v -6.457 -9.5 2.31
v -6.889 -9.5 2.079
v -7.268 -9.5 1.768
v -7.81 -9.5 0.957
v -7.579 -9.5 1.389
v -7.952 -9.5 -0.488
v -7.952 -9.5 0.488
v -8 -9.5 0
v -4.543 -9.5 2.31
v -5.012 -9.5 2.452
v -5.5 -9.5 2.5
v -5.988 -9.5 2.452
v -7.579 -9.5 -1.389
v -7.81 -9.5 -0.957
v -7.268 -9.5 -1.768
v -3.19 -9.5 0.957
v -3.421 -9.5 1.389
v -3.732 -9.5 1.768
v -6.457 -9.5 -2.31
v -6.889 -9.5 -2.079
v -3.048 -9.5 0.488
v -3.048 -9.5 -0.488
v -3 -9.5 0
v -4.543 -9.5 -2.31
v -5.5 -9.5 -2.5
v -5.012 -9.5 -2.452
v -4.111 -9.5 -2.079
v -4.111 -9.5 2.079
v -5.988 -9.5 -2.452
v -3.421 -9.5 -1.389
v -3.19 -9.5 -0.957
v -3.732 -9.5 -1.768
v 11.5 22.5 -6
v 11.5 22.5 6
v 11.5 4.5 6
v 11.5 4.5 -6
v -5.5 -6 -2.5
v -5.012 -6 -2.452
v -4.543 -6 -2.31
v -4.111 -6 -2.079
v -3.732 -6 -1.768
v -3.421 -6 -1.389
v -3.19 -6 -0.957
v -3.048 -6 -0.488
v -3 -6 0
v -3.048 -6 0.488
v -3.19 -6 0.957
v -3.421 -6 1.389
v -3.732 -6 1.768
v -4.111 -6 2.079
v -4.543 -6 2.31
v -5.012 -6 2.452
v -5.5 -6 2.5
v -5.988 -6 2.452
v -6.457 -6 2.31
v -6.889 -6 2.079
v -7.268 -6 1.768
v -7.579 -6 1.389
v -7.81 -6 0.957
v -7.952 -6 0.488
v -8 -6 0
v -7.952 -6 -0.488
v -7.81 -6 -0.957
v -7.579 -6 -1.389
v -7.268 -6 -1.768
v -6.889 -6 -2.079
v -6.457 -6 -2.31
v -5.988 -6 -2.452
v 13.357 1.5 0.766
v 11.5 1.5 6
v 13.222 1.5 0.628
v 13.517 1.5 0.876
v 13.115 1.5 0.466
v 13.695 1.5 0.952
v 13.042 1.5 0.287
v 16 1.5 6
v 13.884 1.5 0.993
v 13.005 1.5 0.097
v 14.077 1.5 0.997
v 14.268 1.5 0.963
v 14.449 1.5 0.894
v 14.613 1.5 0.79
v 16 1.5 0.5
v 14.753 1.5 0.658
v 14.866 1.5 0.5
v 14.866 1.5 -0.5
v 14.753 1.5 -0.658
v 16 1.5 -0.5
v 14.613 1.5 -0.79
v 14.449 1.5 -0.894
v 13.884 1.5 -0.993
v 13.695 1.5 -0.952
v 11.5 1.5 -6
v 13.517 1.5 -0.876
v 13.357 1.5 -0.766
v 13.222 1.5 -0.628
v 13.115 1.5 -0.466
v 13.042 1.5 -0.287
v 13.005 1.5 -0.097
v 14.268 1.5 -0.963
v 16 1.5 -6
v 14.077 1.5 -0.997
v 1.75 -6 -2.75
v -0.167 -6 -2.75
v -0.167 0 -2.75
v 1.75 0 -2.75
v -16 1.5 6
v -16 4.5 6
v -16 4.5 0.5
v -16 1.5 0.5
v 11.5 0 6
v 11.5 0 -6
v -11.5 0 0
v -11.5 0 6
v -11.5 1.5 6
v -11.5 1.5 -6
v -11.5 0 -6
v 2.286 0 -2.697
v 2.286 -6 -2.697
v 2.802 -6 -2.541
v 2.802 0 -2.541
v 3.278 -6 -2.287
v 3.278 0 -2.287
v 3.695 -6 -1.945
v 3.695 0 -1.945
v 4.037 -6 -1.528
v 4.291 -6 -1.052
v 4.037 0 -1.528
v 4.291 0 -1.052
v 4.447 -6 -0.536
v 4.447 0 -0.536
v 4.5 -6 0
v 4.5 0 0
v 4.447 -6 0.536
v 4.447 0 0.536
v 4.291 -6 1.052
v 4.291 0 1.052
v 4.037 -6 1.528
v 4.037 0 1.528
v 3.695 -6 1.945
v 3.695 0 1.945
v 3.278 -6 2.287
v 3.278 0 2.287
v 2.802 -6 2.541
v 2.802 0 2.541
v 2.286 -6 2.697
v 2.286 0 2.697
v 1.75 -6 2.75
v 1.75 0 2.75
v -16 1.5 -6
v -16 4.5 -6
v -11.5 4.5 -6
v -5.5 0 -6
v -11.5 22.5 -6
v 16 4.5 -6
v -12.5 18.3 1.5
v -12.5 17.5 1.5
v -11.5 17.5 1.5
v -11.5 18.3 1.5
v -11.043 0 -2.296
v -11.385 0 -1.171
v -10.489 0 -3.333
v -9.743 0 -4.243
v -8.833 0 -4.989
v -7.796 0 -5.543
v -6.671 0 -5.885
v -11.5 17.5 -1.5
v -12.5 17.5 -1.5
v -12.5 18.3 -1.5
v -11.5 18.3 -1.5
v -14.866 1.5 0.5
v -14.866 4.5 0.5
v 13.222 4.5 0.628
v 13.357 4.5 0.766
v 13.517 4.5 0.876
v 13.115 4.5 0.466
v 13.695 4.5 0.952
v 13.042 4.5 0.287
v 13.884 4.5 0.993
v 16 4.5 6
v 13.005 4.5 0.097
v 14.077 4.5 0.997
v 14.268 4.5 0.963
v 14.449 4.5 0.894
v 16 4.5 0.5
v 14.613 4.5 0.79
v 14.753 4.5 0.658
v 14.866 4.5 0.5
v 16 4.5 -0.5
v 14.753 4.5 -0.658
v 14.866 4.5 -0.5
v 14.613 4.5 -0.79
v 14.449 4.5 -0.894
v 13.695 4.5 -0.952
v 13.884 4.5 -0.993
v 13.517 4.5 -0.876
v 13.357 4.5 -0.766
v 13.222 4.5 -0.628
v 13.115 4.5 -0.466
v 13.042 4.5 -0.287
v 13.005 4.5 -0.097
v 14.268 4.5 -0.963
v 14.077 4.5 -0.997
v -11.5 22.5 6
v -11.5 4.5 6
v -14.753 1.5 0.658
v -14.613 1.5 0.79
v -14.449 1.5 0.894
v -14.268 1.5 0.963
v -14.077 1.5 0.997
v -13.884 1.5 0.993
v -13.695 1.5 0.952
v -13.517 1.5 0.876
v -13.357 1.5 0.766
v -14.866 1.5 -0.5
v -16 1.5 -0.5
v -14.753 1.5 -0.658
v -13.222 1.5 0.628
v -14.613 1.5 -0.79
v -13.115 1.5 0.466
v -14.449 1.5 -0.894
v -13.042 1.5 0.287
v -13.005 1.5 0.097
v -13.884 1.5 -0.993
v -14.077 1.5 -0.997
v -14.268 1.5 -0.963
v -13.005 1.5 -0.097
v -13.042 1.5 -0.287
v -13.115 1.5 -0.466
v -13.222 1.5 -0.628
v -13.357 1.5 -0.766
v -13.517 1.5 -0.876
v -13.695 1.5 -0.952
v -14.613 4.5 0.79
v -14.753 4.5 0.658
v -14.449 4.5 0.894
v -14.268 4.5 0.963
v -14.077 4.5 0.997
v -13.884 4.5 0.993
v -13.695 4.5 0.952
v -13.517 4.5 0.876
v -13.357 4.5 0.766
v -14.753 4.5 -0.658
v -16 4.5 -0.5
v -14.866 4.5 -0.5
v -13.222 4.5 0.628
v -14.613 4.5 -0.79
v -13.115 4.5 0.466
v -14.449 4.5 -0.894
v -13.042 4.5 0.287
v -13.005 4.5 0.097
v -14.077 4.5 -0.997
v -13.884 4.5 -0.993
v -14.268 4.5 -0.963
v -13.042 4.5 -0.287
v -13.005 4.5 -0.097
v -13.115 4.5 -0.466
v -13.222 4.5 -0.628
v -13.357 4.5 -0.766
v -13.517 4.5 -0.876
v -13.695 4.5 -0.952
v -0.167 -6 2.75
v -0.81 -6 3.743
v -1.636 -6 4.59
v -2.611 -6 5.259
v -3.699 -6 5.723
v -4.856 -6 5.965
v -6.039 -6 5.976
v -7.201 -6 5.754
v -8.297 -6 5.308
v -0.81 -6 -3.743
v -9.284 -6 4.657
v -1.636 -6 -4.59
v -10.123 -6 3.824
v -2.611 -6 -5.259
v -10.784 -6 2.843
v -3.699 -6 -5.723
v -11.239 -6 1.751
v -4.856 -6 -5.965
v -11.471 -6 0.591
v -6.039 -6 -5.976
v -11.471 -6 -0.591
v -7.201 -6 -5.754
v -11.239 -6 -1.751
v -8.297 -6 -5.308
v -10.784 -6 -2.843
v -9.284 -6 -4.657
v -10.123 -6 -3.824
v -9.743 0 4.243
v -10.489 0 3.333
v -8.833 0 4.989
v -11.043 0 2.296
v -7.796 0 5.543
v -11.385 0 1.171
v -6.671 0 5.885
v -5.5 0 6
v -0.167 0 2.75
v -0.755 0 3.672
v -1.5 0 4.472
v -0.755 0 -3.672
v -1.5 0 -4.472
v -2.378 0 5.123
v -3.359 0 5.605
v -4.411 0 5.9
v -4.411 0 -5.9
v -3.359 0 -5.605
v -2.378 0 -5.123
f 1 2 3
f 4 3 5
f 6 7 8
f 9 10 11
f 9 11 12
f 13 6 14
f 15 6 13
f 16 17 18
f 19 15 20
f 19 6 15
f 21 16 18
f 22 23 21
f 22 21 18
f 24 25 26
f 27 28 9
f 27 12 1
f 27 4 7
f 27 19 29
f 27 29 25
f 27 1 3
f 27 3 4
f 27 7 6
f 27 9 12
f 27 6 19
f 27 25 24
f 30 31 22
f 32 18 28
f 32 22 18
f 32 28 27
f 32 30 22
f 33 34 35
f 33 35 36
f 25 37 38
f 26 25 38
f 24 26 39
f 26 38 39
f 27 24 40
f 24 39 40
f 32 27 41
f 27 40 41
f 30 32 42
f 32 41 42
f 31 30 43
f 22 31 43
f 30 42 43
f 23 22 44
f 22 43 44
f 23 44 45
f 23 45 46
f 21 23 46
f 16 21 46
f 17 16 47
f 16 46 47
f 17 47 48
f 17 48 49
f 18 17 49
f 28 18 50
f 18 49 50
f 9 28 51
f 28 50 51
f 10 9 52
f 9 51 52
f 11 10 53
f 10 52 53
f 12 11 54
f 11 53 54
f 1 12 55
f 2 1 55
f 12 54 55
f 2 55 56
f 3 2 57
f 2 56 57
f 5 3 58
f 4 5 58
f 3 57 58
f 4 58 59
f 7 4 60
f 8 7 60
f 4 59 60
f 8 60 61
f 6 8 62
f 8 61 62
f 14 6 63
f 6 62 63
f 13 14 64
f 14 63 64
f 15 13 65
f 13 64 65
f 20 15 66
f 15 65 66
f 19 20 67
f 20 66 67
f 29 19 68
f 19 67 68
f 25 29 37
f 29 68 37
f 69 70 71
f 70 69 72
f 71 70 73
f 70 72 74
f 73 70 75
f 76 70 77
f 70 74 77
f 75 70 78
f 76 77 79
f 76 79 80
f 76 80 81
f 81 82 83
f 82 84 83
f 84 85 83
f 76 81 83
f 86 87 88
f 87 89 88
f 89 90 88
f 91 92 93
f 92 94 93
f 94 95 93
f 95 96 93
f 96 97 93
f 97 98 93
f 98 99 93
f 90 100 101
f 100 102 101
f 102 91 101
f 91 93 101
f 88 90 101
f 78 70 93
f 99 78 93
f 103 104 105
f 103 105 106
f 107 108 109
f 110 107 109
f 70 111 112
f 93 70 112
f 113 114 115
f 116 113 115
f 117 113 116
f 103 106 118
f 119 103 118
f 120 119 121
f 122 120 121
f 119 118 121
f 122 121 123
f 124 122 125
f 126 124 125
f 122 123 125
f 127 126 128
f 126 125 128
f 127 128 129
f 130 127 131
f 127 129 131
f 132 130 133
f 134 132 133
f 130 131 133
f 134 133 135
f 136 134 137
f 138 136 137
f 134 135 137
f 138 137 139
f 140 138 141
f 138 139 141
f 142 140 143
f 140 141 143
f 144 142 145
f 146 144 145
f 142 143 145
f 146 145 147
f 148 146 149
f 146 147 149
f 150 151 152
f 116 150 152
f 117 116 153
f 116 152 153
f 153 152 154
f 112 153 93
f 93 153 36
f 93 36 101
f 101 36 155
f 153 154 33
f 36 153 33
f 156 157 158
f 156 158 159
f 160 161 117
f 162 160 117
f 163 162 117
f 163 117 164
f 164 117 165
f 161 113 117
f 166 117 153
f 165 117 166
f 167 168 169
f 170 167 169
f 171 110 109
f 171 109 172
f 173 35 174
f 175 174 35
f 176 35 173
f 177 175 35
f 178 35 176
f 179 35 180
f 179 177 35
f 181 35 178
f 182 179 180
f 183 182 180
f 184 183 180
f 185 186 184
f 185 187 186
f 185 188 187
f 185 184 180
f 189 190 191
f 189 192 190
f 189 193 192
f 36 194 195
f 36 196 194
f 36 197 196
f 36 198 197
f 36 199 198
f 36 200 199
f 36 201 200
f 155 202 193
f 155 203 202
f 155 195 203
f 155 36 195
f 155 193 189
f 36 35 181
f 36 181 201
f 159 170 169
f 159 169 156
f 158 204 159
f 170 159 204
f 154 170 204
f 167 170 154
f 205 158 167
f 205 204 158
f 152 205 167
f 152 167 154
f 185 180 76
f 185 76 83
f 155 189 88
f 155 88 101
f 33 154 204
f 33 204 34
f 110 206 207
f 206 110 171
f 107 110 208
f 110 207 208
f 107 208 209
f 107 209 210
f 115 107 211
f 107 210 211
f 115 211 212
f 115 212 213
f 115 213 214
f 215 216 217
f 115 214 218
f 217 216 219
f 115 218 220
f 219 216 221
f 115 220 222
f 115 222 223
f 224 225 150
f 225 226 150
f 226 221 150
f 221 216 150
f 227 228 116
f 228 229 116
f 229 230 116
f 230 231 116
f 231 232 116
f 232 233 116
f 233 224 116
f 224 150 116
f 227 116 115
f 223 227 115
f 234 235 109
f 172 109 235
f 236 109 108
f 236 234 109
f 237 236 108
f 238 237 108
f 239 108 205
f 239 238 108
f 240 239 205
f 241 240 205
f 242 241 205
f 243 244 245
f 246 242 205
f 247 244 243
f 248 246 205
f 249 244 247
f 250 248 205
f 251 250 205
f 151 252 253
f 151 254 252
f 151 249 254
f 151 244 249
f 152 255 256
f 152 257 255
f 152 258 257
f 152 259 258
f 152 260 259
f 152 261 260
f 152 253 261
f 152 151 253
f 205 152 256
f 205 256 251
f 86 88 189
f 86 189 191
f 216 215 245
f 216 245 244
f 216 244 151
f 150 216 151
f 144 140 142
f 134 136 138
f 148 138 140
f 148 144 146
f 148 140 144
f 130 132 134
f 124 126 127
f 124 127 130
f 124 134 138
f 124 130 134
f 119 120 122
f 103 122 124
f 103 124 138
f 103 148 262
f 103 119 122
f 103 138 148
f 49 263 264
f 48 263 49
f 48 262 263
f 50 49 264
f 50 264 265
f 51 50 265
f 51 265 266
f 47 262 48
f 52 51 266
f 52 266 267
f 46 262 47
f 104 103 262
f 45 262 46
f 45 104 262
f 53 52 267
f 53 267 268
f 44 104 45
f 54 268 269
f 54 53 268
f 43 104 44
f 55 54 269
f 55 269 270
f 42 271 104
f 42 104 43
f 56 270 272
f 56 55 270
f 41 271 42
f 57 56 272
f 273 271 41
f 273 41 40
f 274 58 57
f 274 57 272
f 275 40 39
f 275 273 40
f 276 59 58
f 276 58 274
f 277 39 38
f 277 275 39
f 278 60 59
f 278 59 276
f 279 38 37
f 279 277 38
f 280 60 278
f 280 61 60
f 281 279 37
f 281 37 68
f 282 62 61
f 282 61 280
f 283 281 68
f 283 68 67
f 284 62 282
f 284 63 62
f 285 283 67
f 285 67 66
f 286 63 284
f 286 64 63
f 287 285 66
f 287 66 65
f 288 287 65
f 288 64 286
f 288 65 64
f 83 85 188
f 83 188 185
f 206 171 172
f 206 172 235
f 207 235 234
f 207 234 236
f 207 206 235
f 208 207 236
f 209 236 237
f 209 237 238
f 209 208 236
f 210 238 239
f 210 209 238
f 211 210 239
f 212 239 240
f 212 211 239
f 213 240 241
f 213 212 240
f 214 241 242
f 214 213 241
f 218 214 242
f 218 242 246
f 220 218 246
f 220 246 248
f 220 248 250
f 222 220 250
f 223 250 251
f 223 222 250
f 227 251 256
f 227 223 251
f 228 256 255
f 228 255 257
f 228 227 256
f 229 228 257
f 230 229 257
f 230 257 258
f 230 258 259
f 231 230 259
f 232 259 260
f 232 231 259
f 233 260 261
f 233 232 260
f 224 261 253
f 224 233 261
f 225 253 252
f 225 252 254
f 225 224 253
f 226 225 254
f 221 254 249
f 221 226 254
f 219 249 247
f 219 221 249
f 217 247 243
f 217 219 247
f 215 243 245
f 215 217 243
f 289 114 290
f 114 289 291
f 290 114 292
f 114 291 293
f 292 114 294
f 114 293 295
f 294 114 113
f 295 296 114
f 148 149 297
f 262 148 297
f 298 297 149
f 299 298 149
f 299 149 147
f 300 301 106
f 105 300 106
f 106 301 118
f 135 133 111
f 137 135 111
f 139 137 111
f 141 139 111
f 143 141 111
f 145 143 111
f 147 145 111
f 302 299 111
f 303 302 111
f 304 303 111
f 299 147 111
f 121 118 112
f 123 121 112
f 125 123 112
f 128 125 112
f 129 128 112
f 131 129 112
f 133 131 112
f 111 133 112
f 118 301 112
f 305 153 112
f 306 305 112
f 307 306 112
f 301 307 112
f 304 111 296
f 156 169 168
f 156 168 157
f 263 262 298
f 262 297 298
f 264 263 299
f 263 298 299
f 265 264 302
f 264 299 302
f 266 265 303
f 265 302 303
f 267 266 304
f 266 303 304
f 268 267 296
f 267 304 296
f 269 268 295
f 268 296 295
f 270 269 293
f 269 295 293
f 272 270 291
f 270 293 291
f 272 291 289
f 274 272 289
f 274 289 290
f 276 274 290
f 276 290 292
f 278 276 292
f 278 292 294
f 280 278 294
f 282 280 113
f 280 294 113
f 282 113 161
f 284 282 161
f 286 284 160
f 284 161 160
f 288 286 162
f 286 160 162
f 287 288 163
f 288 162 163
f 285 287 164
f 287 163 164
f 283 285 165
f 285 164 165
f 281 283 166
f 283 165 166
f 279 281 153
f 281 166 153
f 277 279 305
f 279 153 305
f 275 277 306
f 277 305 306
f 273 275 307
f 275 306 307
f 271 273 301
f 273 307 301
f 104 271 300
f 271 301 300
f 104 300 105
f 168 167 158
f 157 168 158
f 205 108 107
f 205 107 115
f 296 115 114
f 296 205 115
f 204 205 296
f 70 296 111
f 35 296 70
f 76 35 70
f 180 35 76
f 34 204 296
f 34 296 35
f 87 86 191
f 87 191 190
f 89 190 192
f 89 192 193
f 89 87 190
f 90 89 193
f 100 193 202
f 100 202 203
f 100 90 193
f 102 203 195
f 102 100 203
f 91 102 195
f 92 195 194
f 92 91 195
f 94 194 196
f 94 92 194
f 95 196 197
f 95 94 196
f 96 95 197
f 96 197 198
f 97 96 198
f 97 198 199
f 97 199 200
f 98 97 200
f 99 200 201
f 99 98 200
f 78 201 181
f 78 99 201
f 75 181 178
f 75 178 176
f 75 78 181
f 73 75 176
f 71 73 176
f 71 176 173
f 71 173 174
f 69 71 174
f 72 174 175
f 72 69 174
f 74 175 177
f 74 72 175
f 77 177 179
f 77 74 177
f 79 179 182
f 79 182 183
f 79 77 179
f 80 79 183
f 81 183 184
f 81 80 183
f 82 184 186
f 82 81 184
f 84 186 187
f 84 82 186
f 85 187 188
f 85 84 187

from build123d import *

# Parameters (mm, degrees)
SKETCH_1_W          = 23
SKETCH_1_H          = 12
EXTRUDE_1_DEPTH     = 22.5
SKETCH_3_W          = 32
SKETCH_3_H          = 12
EXTRUDE_2_DEPTH     = 3
CUT_EXTRUDE_1_DEPTH = 3
SKETCH_5_R          = 6
EXTRUDE_3_DEPTH     = 6
SKETCH_6_R          = 2.5
EXTRUDE_4_DEPTH     = 3.5
EXTRUDE_5_DEPTH     = 6
SKETCH_8_W          = 3
SKETCH_8_H          = 0.8
EXTRUDE_6_DEPTH     = 1


with BuildPart() as part:
    # 草图1 → 凸台-拉伸1 (new body)
    with BuildSketch(Plane(origin=(0, 0, 0), x_dir=(1, 0, 0), z_dir=(0, 1, 0))):
        Rectangle(SKETCH_1_W, SKETCH_1_H)
    extrude(amount=EXTRUDE_1_DEPTH)

    # 草图3 → 凸台-拉伸2 (add)
    with BuildSketch(Plane(origin=(0, 4.5, 0), x_dir=(1, 0, 0), z_dir=(0, 1, 0))):
        Rectangle(SKETCH_3_W, SKETCH_3_H)
    extrude(amount=-EXTRUDE_2_DEPTH)

    # 草图4 → 切除-拉伸1 (cut)
    with BuildSketch(Plane.XZ.offset(-1.5)):
        with BuildLine():
            Line((-16.941045567, 0.5), (-14.866025404, 0.5))
            ThreePointArc((-14.866025404, 0.5), (-13, 0), (-14.866025404, -0.5))
            Line((-14.866025404, -0.5), (-16.941045567, -0.5))
            Line((-16.941045567, -0.5), (-16.941045567, 0.5))
        make_face()
        with BuildLine():
            Line((16.941045567, 0.5), (16.941045567, -0.5))
            Line((16.941045567, -0.5), (14.866025404, -0.5))
            ThreePointArc((14.866025404, -0.5), (13, 0), (14.866025404, 0.5))
            Line((14.866025404, 0.5), (16.941045567, 0.5))
        make_face()
    extrude(amount=-CUT_EXTRUDE_1_DEPTH, mode=Mode.SUBTRACT)

    # 草图5 → 凸台-拉伸3 (add)
    with BuildSketch(Plane.XZ):
        with Locations(Location((-5.5, 0, 0), (0, 0, 270))):
            Circle(SKETCH_5_R)
    extrude(amount=EXTRUDE_3_DEPTH)

    # 草图6 → 凸台-拉伸4 (add)
    with BuildSketch(Plane.XZ.offset(6)):
        with Locations(Location((-5.5, 0, 0), (0, 0, 270))):
            Circle(SKETCH_6_R)
    extrude(amount=EXTRUDE_4_DEPTH)

    # 草图7 → 凸台-拉伸5 (add)
    with BuildSketch(Plane(origin=(0, 0, 0), x_dir=(1, 0, 0), z_dir=(0, 1, 0))):
        with BuildLine():
            Line((1.75, -2.75), (-1.67047712, -2.75))
            Line((-1.67047712, -2.75), (-1.67047712, 2.75))
            Line((-1.67047712, 2.75), (1.75, 2.75))
            ThreePointArc((1.75, 2.75), (4.5, 0), (1.75, -2.75))
        make_face()
    extrude(amount=-EXTRUDE_5_DEPTH)

    # 草图8 → 凸台-拉伸6 (add)
    with BuildSketch(Plane.ZY.offset(11.5)):
        with Locations((0, 17.9)):
            Rectangle(SKETCH_8_W, SKETCH_8_H)
    extrude(amount=EXTRUDE_6_DEPTH)


solid = part.part
